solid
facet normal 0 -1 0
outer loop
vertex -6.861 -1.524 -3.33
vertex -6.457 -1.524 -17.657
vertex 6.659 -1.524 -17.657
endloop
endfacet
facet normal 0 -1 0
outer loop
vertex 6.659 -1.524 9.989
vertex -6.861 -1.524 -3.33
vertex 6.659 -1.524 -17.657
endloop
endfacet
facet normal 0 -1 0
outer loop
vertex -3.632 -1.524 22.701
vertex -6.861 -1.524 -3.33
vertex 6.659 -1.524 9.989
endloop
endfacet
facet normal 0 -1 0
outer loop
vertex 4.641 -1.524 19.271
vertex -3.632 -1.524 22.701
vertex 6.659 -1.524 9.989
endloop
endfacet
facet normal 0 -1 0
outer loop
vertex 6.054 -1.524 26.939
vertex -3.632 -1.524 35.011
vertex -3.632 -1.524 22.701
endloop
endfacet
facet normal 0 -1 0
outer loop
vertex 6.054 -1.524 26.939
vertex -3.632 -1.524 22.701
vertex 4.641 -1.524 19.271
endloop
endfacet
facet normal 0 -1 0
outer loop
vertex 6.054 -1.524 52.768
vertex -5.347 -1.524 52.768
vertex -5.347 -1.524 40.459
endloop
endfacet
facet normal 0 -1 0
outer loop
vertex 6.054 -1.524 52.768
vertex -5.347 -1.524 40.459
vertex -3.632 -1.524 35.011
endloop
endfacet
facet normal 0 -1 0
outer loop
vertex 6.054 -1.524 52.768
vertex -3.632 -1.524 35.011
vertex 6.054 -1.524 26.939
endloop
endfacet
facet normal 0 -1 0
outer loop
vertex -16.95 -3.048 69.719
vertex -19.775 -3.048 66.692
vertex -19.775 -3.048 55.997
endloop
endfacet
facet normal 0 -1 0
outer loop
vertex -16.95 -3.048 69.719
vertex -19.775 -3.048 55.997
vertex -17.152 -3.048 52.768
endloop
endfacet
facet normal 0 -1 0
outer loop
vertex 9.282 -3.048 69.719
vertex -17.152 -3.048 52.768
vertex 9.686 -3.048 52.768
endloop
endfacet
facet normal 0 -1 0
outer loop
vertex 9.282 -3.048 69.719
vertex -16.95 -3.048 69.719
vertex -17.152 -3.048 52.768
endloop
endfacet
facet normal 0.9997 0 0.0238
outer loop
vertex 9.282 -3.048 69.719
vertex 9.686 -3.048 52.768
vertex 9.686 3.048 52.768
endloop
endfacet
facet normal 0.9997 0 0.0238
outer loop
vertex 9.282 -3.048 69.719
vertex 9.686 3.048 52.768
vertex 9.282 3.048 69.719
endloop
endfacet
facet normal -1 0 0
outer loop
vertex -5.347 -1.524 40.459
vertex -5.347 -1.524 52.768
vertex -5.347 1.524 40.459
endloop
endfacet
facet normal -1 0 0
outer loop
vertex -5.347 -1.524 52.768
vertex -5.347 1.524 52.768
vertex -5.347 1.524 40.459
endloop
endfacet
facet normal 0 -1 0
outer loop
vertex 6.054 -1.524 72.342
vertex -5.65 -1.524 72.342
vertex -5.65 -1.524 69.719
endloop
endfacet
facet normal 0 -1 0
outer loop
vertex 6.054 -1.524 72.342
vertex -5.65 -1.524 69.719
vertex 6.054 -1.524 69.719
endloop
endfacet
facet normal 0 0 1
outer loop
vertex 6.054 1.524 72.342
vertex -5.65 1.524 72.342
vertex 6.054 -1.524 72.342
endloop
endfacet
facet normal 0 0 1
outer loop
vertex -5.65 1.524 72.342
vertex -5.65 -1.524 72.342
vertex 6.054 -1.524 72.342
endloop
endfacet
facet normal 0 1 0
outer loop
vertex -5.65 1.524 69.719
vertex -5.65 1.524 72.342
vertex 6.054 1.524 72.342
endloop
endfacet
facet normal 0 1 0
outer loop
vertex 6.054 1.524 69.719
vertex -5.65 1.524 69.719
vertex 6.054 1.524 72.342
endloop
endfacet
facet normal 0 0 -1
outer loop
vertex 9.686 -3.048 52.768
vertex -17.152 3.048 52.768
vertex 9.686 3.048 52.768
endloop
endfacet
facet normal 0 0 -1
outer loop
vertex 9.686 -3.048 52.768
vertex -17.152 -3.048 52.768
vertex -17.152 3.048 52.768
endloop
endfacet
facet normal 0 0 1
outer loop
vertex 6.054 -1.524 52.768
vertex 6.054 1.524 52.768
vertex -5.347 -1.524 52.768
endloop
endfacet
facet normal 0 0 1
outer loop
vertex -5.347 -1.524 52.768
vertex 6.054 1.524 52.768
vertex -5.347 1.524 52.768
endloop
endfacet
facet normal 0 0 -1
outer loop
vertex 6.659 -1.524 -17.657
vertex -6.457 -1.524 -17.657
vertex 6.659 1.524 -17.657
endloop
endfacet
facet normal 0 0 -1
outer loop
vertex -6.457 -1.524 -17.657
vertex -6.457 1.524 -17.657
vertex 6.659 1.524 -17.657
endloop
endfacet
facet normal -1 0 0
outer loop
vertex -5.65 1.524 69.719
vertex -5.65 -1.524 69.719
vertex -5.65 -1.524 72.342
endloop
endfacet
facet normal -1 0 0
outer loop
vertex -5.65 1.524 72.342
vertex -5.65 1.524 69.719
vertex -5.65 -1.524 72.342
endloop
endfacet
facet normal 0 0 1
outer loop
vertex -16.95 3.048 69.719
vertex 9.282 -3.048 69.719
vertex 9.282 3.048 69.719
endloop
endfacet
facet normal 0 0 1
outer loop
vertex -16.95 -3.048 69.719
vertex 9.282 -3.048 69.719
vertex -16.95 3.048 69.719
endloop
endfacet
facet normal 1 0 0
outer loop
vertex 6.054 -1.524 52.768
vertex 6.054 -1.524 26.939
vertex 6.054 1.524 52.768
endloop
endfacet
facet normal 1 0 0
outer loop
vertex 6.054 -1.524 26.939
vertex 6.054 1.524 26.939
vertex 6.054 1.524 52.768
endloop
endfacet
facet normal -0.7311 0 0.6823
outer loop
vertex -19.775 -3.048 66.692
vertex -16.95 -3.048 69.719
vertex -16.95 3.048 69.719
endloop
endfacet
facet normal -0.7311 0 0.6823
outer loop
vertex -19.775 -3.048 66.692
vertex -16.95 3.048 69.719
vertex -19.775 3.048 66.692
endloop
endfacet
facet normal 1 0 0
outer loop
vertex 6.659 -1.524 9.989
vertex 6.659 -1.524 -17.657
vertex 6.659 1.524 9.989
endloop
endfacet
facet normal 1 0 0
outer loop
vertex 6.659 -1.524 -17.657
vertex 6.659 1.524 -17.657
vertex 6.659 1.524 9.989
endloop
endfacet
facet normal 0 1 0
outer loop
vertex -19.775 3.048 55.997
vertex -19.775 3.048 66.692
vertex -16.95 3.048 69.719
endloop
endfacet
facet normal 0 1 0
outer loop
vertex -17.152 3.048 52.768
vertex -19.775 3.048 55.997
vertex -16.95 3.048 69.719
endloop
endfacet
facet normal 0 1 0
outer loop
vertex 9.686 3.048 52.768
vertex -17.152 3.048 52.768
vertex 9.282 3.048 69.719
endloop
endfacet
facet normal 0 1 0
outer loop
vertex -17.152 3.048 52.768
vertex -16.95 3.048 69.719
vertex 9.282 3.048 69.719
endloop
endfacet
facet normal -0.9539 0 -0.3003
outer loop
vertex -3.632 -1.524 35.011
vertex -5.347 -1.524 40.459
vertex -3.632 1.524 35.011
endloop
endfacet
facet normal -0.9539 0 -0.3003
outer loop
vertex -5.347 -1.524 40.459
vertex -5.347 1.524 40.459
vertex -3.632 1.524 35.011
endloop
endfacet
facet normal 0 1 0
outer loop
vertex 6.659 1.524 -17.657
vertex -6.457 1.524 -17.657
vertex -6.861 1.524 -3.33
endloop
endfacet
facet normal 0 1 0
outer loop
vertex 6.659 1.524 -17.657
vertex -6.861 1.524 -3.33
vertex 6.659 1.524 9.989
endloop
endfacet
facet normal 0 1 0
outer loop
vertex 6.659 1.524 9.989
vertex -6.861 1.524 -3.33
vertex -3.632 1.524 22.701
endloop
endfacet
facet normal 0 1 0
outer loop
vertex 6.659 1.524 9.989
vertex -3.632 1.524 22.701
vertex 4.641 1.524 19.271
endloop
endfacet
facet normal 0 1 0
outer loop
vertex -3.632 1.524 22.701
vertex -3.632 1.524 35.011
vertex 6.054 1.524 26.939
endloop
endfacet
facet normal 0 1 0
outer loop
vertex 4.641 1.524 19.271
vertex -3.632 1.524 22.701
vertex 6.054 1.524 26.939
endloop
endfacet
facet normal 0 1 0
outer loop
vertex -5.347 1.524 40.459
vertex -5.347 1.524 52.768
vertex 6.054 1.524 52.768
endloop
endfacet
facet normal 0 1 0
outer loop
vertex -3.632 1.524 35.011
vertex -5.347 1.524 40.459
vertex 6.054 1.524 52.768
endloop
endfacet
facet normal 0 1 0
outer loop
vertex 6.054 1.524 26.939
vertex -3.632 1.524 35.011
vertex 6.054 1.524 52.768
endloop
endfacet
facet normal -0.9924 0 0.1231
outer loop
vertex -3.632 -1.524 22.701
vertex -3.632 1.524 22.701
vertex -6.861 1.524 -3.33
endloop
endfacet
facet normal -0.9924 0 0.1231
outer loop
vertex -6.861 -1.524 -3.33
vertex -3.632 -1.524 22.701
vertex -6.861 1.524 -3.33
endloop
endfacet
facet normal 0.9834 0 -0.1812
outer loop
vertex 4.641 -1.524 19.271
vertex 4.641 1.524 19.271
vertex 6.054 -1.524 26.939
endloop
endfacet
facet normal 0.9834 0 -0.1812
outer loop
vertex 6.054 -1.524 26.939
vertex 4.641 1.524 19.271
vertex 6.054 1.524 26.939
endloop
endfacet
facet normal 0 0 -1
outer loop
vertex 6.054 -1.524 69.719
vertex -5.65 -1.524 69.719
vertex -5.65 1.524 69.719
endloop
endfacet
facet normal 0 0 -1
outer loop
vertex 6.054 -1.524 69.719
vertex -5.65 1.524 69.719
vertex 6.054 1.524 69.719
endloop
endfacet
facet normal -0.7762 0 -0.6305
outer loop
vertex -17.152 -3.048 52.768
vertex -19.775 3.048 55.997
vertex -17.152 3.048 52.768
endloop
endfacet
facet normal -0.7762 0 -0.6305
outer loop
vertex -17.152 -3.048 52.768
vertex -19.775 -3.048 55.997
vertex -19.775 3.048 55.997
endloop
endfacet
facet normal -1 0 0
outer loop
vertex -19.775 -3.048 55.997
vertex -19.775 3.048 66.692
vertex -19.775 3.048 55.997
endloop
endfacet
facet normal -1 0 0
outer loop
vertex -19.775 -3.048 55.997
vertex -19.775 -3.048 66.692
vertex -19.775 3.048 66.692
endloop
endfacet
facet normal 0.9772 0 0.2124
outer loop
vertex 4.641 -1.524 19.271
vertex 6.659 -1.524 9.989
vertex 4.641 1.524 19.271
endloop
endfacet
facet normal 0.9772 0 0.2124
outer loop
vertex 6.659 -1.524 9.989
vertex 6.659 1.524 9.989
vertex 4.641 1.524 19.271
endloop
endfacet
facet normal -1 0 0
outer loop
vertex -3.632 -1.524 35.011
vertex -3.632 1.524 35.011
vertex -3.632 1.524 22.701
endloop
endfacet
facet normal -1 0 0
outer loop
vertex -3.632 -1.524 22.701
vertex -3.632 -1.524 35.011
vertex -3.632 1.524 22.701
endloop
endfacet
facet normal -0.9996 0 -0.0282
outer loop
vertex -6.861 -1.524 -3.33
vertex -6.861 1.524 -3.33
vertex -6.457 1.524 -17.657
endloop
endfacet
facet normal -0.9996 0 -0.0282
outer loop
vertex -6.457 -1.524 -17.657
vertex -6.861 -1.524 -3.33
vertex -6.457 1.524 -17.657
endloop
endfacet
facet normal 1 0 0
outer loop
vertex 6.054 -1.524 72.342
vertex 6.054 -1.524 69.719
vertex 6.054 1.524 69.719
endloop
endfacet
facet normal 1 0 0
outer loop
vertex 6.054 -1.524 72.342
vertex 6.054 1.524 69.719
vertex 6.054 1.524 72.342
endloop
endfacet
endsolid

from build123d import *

# Parameters (mm, degrees)
F0_W     = 11.703859
F0_H     = 2.623275
F1_DEPTH = 1.524
F2_DEPTH = 3.048


with BuildPart() as f1:
    # F0 (on Front) → F1 (new body, symmetric)
    with BuildSketch(Plane.XZ):
        Polygon((-6.860883, -3.329546), (-6.457301, -17.656684), (6.659092, -17.656684), (6.659092, 9.988638), (4.641186, 19.271009), (6.05372, 26.939055), (6.05372, 45.100212), (6.05372, 52.76826), (-5.347453, 52.76826), (-5.347453, 40.459029), (-3.632233, 35.010681), (-3.632233, 22.70145), align=None)
        with Locations((0.20179, 71.030318)):
            Rectangle(F0_W, F0_H)
    extrude(amount=F1_DEPTH, both=True)


with BuildPart() as f2:
    # F0 (on Front) → F2 (new body, symmetric)
    with BuildSketch(Plane.XZ):
        Polygon((-17.152207, 52.76826), (-5.347453, 52.76826), (6.05372, 52.76826), (9.685952, 52.76826), (9.282372, 69.718681), (6.05372, 69.718681), (-5.650139, 69.718681), (-16.950415, 69.718681), (-19.775486, 66.691816), (-19.775486, 55.996913), align=None)
    extrude(amount=F2_DEPTH, both=True)


solid = Compound([f1.part, f2.part])
